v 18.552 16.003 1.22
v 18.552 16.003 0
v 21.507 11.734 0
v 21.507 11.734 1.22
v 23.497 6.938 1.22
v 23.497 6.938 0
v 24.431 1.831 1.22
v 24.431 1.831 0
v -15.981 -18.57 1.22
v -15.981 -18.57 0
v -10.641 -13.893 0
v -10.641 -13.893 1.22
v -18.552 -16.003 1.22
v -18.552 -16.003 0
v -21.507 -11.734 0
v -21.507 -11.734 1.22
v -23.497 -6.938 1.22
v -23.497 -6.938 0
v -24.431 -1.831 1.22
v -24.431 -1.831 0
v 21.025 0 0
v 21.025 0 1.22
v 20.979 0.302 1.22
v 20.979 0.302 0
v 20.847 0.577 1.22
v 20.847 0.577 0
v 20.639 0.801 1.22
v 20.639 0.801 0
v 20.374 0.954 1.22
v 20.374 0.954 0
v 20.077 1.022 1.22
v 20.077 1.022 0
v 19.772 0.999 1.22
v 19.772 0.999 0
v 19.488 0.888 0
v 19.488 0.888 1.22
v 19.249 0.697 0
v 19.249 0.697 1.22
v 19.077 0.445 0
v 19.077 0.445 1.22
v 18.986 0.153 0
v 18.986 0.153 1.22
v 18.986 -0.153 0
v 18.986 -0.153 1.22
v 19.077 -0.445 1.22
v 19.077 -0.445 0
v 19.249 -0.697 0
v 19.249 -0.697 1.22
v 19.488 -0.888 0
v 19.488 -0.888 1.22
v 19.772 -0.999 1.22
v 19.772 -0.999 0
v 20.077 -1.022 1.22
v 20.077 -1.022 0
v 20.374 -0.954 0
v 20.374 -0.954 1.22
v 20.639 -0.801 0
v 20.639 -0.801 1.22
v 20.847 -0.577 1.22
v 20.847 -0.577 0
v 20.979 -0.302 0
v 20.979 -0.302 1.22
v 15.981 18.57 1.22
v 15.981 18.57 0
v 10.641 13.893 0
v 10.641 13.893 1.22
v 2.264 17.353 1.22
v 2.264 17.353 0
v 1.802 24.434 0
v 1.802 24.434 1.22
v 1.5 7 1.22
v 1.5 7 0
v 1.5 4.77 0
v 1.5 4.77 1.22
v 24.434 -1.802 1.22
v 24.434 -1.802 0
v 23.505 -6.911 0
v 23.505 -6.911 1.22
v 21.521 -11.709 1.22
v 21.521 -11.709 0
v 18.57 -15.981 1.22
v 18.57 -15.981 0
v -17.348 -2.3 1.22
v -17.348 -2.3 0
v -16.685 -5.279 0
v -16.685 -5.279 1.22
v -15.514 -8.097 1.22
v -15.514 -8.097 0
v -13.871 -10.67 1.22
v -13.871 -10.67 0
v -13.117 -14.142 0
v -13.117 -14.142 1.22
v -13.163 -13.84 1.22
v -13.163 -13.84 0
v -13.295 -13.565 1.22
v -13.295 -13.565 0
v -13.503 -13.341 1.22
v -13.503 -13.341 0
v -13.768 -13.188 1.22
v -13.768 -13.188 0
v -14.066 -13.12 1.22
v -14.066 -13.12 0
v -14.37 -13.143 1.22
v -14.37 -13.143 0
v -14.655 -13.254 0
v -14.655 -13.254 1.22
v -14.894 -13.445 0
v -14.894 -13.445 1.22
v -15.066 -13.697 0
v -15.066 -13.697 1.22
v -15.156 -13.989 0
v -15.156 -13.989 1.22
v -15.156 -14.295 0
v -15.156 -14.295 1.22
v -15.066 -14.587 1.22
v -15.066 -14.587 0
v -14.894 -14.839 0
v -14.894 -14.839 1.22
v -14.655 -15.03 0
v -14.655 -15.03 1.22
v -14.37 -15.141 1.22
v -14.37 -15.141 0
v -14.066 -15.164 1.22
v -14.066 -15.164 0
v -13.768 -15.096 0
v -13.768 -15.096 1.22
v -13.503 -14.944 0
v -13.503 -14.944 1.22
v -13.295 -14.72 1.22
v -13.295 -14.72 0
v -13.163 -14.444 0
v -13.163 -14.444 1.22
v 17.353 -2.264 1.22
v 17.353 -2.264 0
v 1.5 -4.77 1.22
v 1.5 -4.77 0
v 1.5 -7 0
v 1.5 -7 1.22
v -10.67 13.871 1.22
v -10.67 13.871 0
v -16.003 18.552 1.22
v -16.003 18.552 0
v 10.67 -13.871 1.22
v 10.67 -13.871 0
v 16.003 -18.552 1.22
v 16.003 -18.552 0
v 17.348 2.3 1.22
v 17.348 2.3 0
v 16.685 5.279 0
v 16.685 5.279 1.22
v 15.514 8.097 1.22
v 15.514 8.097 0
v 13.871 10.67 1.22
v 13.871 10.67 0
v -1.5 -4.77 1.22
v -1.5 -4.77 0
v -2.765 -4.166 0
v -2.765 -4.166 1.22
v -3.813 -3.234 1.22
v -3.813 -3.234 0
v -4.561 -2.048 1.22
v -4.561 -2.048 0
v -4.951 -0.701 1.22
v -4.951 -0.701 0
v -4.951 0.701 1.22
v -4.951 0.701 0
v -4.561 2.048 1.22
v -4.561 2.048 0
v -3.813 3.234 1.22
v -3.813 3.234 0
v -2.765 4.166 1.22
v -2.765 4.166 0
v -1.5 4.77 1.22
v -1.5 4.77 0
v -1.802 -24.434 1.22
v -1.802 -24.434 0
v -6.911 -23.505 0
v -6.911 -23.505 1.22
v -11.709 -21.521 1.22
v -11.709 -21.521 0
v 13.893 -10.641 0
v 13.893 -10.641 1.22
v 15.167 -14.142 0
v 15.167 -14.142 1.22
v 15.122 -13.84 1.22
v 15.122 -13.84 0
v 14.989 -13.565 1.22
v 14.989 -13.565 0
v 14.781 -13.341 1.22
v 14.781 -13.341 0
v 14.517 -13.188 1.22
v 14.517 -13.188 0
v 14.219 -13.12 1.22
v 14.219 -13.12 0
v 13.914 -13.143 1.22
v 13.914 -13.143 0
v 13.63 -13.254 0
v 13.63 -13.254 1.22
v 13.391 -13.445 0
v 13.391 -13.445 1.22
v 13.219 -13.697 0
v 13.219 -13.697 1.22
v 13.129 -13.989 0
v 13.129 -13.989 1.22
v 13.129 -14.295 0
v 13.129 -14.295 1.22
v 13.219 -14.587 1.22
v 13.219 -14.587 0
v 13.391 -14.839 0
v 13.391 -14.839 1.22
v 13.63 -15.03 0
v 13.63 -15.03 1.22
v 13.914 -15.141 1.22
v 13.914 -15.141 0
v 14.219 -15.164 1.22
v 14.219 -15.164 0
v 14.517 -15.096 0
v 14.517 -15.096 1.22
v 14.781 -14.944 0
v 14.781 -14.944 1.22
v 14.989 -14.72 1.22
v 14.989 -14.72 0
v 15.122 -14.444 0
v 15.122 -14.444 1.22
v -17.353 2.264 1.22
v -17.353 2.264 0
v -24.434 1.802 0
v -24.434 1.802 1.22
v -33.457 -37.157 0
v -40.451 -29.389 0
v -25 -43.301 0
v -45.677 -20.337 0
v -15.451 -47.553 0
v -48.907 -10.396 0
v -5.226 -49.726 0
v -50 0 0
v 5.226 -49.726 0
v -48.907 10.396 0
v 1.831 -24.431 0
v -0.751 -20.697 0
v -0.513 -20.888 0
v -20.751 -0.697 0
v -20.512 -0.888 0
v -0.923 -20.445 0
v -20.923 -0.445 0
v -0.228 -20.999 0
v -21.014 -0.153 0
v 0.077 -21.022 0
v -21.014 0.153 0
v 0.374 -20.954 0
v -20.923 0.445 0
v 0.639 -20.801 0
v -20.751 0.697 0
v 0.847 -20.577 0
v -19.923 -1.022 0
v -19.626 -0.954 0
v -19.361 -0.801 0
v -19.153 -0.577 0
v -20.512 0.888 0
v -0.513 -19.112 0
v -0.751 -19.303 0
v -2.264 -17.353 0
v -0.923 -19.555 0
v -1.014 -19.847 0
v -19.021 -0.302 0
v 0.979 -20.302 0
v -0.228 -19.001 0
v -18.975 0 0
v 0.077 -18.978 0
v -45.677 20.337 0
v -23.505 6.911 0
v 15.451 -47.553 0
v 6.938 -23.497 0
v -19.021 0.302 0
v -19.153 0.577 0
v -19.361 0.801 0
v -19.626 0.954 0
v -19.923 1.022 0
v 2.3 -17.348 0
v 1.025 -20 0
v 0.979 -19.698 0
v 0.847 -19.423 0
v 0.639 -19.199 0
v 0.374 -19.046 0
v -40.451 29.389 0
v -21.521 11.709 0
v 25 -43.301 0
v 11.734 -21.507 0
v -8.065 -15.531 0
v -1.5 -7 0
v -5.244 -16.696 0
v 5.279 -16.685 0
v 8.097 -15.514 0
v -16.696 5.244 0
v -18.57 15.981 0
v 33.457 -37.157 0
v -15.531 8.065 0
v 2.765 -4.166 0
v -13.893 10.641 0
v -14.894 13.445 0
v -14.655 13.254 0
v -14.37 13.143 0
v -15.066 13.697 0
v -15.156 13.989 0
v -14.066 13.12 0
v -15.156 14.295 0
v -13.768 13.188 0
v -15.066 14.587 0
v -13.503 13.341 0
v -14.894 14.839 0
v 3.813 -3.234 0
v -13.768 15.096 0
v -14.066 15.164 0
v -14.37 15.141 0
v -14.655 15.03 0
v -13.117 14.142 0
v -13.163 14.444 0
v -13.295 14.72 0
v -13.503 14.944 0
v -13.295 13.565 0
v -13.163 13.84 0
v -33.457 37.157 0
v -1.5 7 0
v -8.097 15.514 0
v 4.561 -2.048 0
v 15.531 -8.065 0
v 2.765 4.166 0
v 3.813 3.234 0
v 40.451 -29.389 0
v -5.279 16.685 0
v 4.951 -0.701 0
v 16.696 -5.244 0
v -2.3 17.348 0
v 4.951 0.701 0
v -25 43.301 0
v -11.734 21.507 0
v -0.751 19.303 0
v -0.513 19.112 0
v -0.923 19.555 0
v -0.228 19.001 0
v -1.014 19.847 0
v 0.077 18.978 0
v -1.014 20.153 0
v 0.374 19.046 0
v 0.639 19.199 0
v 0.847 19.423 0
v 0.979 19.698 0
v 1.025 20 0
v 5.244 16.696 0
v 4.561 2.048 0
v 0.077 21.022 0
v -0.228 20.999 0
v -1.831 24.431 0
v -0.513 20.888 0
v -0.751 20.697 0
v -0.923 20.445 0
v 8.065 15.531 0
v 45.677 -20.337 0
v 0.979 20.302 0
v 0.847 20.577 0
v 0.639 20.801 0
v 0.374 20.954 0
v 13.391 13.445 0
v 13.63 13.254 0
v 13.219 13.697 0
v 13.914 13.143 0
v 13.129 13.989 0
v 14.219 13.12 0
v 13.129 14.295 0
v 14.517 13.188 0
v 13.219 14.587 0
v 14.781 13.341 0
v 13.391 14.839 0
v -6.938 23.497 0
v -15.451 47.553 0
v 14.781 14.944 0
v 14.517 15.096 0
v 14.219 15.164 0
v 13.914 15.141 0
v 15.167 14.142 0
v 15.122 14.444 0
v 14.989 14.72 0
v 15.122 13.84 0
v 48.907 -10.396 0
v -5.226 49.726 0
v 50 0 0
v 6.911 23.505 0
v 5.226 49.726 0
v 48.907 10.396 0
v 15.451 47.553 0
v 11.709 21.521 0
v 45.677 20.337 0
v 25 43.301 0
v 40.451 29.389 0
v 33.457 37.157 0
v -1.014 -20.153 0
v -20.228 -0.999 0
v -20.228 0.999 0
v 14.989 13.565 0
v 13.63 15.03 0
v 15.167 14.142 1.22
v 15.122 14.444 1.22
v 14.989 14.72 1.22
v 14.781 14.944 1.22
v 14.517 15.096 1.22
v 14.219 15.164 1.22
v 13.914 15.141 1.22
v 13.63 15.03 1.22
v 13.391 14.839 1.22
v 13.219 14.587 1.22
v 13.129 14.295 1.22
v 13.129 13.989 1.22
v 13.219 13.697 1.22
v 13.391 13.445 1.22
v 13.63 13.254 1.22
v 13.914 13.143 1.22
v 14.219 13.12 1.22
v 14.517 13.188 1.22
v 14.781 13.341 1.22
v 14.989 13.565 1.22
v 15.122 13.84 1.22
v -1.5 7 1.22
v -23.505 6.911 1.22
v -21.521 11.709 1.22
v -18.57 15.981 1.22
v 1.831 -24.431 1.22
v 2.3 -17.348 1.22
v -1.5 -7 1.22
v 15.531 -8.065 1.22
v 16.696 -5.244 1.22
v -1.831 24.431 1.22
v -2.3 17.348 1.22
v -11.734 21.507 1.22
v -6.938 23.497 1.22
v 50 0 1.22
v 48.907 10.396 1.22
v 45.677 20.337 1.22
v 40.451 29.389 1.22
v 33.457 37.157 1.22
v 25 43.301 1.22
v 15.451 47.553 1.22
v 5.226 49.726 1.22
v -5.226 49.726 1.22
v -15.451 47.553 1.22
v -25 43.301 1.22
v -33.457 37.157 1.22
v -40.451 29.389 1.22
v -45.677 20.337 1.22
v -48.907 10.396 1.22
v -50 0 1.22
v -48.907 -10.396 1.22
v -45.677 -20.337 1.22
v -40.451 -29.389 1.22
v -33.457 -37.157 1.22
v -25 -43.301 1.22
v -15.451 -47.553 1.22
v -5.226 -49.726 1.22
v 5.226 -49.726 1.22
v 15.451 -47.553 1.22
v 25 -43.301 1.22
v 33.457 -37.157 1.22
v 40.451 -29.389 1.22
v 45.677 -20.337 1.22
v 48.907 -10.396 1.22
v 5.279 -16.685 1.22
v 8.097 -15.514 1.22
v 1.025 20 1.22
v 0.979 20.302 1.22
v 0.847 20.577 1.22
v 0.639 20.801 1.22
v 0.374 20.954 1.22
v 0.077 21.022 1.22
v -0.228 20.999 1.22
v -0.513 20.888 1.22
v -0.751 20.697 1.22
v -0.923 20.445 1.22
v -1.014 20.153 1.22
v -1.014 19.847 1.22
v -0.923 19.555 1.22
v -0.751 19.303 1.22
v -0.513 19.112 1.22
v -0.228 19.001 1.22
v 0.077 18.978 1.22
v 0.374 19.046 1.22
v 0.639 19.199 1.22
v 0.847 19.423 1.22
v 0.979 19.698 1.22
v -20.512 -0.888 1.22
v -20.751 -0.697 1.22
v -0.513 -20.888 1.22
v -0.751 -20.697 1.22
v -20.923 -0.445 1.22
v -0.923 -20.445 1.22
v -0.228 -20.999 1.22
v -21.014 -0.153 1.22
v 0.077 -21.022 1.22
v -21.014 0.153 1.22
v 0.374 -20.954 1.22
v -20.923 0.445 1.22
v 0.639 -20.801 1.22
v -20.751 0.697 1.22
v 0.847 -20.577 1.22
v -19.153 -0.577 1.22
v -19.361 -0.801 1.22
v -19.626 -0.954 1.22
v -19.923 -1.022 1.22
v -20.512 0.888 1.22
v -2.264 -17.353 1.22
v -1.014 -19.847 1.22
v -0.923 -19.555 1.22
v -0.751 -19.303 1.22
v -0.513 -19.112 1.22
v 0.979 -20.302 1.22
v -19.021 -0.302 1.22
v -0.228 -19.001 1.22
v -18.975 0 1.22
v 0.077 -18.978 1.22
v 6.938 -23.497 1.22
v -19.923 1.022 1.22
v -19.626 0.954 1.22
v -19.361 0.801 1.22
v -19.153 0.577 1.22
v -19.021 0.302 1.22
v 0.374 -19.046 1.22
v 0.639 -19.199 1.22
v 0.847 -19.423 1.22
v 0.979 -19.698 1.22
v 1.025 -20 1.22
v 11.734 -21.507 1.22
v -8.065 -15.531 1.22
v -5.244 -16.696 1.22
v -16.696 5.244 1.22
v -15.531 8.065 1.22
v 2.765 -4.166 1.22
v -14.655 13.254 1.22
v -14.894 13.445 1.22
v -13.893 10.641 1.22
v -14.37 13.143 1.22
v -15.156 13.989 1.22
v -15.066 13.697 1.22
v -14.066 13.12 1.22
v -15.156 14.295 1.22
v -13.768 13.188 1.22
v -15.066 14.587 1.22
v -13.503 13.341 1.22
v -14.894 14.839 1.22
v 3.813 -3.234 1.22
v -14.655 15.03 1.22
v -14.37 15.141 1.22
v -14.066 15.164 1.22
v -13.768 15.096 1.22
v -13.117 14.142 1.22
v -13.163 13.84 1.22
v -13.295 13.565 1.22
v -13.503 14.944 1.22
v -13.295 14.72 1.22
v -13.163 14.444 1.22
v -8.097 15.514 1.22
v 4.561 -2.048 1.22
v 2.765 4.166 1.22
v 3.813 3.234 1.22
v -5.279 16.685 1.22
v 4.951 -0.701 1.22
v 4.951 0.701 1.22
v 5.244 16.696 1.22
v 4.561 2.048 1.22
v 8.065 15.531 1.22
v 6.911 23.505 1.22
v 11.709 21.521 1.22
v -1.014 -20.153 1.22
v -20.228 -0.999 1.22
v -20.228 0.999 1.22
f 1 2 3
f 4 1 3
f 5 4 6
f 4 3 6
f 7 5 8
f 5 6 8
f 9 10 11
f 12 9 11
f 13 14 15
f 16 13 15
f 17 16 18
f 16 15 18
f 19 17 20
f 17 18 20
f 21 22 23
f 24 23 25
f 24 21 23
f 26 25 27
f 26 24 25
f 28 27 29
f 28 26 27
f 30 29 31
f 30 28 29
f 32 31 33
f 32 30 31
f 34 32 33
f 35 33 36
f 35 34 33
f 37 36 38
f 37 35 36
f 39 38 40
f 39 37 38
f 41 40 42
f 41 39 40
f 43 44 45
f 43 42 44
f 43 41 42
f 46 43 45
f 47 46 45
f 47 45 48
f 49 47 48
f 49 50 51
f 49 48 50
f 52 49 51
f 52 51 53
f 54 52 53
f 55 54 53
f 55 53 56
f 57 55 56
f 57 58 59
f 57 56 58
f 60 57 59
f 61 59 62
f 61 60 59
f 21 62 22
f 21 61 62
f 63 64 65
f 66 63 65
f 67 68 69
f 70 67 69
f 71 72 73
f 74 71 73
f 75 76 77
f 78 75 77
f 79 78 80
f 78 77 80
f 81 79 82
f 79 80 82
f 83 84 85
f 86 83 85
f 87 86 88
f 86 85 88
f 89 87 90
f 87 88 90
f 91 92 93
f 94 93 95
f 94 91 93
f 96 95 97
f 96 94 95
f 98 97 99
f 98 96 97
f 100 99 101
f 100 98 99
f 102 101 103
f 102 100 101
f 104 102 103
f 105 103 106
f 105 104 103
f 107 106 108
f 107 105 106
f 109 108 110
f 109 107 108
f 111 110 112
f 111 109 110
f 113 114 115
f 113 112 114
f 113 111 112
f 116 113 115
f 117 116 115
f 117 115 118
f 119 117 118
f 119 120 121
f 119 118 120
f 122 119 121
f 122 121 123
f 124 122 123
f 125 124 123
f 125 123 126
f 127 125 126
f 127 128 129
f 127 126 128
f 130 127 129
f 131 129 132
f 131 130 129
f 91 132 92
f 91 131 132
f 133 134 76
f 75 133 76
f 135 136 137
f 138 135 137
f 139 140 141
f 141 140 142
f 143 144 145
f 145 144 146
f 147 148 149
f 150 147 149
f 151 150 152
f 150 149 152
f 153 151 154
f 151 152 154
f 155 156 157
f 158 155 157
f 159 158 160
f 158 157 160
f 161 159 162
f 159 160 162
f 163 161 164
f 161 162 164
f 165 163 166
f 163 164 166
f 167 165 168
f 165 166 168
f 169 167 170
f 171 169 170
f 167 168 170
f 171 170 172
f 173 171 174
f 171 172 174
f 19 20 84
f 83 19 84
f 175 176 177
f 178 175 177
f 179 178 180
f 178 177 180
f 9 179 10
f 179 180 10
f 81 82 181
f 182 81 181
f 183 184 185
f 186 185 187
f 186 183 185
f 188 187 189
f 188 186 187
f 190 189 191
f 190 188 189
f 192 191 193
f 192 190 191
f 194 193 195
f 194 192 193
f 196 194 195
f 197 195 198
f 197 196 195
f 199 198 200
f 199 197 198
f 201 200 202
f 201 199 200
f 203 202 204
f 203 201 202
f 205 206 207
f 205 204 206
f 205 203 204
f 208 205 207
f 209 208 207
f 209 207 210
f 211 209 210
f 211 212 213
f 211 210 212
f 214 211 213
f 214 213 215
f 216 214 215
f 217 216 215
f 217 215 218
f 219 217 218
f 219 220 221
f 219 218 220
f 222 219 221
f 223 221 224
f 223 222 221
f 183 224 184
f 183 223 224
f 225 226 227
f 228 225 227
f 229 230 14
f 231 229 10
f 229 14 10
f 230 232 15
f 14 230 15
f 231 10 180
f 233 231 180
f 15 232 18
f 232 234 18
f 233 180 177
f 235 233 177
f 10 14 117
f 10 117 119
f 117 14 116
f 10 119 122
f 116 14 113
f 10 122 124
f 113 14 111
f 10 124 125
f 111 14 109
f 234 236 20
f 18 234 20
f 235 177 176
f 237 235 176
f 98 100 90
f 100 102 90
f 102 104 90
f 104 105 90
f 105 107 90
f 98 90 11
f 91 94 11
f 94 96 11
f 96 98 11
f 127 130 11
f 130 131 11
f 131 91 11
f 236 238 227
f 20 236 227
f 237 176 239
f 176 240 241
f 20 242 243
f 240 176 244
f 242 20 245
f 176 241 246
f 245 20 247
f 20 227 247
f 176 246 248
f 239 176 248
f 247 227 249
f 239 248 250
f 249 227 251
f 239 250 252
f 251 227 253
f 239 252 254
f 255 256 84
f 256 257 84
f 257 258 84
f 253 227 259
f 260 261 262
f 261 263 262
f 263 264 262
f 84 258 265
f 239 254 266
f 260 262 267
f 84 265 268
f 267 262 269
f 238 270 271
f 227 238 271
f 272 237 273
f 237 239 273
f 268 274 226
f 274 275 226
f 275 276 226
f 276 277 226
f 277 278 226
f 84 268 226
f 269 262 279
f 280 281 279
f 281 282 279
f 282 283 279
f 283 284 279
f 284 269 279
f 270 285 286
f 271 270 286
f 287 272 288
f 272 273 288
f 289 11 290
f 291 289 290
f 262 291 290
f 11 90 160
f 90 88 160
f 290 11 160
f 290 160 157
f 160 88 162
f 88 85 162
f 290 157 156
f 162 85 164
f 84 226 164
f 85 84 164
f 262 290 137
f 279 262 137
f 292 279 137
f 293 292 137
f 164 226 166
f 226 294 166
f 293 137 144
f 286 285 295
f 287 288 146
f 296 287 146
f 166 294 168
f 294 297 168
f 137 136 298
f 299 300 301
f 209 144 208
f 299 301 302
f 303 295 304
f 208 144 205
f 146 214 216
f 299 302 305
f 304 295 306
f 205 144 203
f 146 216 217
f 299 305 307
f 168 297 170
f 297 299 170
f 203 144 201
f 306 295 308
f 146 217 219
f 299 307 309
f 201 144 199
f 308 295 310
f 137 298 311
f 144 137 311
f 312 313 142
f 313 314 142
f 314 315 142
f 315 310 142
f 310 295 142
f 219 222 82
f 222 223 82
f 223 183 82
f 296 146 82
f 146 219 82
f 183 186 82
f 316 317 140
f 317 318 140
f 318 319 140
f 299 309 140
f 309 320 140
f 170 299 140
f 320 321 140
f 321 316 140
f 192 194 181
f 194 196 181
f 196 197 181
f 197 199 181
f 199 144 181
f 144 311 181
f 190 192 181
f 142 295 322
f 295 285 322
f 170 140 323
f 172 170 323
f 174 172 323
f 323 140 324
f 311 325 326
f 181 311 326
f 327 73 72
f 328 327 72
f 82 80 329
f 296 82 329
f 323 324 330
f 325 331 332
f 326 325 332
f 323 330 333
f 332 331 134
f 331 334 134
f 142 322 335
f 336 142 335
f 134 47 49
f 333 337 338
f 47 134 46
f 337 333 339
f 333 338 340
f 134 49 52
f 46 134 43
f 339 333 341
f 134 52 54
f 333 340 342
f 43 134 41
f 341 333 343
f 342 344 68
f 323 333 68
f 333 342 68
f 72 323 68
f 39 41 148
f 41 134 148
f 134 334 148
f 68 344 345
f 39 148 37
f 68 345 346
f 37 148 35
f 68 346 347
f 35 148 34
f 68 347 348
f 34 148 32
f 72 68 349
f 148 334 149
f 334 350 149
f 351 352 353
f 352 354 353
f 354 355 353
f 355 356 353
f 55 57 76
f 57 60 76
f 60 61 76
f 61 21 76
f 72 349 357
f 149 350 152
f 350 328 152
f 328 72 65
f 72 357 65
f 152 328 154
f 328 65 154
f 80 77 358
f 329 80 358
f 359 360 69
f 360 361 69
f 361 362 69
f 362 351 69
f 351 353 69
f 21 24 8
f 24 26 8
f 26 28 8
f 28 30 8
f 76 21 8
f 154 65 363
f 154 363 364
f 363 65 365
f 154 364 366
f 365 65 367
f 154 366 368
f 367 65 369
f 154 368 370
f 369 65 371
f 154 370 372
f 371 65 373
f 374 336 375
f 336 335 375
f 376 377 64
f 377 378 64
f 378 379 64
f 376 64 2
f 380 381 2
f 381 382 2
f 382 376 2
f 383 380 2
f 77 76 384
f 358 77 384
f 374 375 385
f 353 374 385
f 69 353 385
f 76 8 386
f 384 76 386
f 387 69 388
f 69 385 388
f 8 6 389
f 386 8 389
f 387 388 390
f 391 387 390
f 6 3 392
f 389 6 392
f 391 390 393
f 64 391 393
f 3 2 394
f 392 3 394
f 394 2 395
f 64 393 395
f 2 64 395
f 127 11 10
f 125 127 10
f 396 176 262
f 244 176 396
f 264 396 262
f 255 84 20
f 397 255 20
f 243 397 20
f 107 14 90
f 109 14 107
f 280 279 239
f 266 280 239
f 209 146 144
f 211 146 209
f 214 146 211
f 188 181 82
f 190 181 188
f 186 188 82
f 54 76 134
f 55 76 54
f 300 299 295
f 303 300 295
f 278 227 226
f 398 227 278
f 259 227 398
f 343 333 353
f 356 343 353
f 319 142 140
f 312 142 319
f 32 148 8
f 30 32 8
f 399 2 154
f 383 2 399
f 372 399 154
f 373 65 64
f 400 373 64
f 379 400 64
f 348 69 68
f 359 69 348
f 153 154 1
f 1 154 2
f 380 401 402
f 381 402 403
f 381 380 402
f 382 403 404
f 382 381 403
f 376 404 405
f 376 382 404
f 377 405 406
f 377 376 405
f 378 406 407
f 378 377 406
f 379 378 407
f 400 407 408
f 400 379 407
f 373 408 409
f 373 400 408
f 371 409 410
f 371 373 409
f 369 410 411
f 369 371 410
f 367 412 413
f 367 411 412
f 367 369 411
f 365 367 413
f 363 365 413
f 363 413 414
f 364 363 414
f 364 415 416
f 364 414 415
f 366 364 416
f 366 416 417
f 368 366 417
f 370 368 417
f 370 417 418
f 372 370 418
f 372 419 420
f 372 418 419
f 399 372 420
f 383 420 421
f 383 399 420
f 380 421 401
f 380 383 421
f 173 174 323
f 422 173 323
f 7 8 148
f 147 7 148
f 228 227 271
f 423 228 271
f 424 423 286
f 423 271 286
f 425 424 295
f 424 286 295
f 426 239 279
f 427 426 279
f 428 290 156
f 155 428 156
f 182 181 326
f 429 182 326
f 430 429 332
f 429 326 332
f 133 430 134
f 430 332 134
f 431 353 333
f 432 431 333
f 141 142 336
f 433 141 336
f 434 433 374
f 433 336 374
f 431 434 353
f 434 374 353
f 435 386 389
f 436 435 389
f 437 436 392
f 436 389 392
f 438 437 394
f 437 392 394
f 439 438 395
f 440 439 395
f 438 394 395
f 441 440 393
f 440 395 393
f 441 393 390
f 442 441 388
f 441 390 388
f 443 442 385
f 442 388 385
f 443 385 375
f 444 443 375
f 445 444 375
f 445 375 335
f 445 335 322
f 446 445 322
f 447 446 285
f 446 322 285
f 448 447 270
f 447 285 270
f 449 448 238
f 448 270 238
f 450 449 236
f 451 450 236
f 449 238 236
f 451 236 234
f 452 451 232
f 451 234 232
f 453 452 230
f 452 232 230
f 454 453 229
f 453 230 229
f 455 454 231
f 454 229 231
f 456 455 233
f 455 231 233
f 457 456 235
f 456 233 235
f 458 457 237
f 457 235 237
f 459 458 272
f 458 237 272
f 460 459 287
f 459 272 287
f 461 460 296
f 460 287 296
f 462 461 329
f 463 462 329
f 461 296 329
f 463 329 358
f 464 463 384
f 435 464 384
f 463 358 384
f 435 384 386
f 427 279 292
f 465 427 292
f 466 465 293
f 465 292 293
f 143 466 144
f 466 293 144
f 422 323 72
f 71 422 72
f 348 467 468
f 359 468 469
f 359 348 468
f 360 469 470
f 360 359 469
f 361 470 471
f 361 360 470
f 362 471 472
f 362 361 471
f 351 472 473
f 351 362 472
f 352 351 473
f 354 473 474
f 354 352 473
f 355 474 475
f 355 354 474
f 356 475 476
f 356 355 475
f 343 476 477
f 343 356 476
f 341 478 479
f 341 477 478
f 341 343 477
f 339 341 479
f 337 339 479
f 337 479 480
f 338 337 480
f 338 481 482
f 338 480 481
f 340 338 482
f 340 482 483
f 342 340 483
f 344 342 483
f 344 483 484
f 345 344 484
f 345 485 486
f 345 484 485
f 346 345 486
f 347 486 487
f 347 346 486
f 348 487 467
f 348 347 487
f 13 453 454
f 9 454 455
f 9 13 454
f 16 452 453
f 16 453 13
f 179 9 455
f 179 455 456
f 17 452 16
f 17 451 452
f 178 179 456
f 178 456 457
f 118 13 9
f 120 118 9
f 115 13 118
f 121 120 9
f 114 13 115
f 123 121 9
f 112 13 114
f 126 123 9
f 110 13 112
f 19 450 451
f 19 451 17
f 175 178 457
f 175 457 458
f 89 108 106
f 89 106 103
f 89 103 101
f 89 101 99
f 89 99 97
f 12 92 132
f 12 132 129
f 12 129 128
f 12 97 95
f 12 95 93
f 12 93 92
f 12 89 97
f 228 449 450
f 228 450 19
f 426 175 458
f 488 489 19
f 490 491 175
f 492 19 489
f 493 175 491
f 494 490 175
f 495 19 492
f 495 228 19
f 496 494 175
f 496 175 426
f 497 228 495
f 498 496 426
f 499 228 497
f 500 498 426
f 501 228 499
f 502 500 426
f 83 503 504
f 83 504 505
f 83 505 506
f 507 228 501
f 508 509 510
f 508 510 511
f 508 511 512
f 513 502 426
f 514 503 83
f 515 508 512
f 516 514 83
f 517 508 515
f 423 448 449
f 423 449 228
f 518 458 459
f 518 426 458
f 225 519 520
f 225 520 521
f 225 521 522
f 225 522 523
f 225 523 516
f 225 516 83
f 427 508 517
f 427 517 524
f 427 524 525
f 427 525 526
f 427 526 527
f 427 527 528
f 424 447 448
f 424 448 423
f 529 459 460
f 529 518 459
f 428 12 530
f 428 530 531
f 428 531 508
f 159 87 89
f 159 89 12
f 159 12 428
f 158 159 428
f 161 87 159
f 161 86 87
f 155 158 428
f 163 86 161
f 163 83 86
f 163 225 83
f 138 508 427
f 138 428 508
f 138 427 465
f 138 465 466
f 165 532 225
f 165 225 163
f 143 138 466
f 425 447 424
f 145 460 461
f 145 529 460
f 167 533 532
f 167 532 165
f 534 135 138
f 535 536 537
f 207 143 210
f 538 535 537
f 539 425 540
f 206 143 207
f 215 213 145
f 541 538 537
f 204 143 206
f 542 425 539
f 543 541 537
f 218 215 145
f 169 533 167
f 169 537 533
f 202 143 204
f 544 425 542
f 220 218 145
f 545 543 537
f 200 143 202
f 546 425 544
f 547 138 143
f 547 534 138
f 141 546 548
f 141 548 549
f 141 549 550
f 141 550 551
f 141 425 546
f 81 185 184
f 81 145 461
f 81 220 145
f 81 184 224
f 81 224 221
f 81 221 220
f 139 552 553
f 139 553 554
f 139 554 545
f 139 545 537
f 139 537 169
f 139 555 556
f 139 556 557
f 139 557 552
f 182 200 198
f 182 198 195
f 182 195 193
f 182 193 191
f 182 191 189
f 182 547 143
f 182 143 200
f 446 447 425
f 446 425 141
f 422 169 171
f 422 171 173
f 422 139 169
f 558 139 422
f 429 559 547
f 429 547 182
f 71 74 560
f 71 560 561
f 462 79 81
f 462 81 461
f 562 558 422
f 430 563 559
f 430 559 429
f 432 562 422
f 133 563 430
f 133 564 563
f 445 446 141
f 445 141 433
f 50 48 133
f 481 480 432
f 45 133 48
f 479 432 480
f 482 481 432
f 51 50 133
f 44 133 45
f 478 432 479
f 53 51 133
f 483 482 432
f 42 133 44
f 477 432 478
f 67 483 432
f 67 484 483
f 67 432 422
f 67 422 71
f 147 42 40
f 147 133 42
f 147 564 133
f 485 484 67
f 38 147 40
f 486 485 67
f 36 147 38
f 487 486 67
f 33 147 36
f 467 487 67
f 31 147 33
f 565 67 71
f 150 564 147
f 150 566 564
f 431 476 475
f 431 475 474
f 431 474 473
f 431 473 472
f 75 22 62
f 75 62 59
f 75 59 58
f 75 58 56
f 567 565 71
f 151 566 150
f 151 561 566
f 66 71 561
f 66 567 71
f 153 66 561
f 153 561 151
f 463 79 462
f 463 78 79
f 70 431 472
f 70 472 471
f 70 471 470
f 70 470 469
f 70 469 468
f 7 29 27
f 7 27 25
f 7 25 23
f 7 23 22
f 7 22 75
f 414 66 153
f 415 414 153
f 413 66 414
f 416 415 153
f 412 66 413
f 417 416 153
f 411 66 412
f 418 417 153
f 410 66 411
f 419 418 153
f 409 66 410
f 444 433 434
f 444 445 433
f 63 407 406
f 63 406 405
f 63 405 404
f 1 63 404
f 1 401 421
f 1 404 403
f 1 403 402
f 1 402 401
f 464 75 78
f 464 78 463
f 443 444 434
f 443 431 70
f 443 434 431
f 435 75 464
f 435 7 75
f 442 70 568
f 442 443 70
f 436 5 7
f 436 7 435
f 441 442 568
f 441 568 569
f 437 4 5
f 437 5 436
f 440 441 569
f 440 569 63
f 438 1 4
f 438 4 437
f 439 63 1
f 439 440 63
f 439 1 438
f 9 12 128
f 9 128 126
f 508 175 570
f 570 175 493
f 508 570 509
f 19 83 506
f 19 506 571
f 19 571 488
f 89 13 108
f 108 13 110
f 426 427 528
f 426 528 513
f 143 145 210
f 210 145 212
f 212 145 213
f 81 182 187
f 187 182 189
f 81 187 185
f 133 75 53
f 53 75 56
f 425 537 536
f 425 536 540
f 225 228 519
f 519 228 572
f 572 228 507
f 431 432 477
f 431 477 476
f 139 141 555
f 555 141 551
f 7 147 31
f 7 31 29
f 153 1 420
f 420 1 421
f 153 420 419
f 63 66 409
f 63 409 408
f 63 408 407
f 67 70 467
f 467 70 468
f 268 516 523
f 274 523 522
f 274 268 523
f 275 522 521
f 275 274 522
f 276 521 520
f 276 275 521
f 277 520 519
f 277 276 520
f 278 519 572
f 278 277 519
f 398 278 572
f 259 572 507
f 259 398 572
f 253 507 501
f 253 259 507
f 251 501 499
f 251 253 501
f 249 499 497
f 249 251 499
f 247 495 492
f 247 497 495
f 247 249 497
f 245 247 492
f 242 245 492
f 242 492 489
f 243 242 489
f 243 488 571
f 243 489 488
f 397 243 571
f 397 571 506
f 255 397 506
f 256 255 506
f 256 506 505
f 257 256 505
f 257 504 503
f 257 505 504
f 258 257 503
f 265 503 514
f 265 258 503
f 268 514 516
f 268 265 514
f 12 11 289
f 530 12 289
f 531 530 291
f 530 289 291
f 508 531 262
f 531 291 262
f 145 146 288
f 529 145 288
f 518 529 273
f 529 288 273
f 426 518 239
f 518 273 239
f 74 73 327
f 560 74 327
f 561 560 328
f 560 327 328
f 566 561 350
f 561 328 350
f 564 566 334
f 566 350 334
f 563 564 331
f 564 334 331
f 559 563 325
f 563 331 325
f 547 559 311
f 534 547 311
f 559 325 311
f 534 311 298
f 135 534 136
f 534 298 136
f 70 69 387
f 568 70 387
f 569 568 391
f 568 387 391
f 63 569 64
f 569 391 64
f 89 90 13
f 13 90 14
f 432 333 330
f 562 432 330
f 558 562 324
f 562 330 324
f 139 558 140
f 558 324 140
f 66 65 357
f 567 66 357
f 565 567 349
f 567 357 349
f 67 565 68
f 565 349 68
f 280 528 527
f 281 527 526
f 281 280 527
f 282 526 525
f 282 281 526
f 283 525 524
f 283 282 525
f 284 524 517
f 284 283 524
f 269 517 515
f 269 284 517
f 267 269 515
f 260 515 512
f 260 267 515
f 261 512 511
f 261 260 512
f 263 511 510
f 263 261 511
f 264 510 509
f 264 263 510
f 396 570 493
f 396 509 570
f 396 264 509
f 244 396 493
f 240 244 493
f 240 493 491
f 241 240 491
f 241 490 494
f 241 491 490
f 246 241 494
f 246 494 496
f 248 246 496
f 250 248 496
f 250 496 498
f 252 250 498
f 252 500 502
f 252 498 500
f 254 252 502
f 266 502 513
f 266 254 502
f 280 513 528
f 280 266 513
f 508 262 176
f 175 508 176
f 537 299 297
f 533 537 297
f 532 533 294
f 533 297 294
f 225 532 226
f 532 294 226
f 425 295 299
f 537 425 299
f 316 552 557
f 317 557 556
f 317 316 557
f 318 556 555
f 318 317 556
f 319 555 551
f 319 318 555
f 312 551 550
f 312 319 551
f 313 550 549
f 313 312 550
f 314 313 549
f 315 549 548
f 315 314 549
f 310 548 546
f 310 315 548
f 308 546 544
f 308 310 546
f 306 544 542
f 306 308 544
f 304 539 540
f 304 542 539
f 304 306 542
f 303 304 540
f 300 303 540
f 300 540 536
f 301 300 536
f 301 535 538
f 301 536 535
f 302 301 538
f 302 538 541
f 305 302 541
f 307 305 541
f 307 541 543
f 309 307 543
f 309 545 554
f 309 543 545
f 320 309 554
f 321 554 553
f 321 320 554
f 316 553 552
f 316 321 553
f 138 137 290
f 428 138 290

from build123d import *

# Parameters (mm, degrees)
BOSS_EXTRUDE1_OUTLINE_R = 50
BOSS_EXTRUDE1_DEPTH     = 1.22
SKETCH2_R               = 1.025
CUT_EXTRUDE2_DEPTH      = 10


# Read off the part's stored shape, not the designer's step: Boss-Extrude1
with BuildPart() as part:
    # Boss-Extrude1 outline → Boss-Extrude1 (new body)
    with BuildSketch(Plane.XY):
        Circle(BOSS_EXTRUDE1_OUTLINE_R)
        with BuildLine():
            ThreePointArc((-10.640683383, -13.893374577), (-6.680080661, -16.174873179), (-2.263779528, -17.352962348))
            Line((-2.263779528, -17.352962348), (-1.802339331, -24.433615634))
            ThreePointArc((-1.802339331, -24.433615634), (-9.36241701, -22.64056421), (-15.980874836, -18.570450707))
            Line((-15.980874836, -18.570450707), (-10.640683383, -13.893374577))
        make_face(mode=Mode.SUBTRACT)
        with BuildLine():
            ThreePointArc((-17.348198754, -2.3), (-16.160892844, -6.713832175), (-13.871131205, -10.669663495))
            Line((-13.871131205, -10.669663495), (-18.551621667, -16.00272894))
            ThreePointArc((-18.551621667, -16.00272894), (-22.629525039, -9.389067926), (-24.431476591, -1.831106659))
            Line((-24.431476591, -1.831106659), (-17.348198754, -2.3))
        make_face(mode=Mode.SUBTRACT)
        with BuildLine():
            ThreePointArc((2.3, -17.348198754), (6.713832175, -16.160892844), (10.669663495, -13.871131205))
            Line((10.669663495, -13.871131205), (16.00272894, -18.551621667))
            ThreePointArc((16.00272894, -18.551621667), (9.389067926, -22.629525039), (1.831106659, -24.431476591))
            Line((1.831106659, -24.431476591), (2.3, -17.348198754))
        make_face(mode=Mode.SUBTRACT)
        with BuildLine():
            ThreePointArc((13.893374577, -10.640683383), (16.174873179, -6.680080661), (17.352962348, -2.263779528))
            Line((17.352962348, -2.263779528), (24.433615634, -1.802339331))
            ThreePointArc((24.433615634, -1.802339331), (22.64056421, -9.36241701), (18.570450707, -15.980874836))
            Line((18.570450707, -15.980874836), (13.893374577, -10.640683383))
        make_face(mode=Mode.SUBTRACT)
        with BuildLine():
            ThreePointArc((-13.893374577, 10.640683383), (-16.174873179, 6.680080661), (-17.352962348, 2.263779528))
            Line((-17.352962348, 2.263779528), (-24.433615634, 1.802339331))
            ThreePointArc((-24.433615634, 1.802339331), (-22.64056421, 9.36241701), (-18.570450707, 15.980874836))
            Line((-18.570450707, 15.980874836), (-13.893374577, 10.640683383))
        make_face(mode=Mode.SUBTRACT)
        with BuildLine():
            ThreePointArc((-2.3, 17.348198754), (-6.713832175, 16.160892844), (-10.669663495, 13.871131205))
            Line((-10.669663495, 13.871131205), (-16.00272894, 18.551621667))
            ThreePointArc((-16.00272894, 18.551621667), (-9.389067926, 22.629525039), (-1.831106659, 24.431476591))
            Line((-1.831106659, 24.431476591), (-2.3, 17.348198754))
        make_face(mode=Mode.SUBTRACT)
        with BuildLine():
            ThreePointArc((-1.5, -4.769696007), (-5, 0), (-1.5, 4.769696007))
            Line((-1.5, 4.769696007), (-1.5, 7))
            Line((-1.5, 7), (1.5, 7))
            Line((1.5, 7), (1.5, 4.769696007))
            ThreePointArc((1.5, 4.769696007), (5, 0), (1.5, -4.769696007))
            Line((1.5, -4.769696007), (1.5, -7))
            Line((1.5, -7), (-1.5, -7))
            Line((-1.5, -7), (-1.5, -4.769696007))
        make_face(mode=Mode.SUBTRACT)
        with BuildLine():
            ThreePointArc((17.348198754, 2.3), (16.160892844, 6.713832175), (13.871131205, 10.669663495))
            Line((13.871131205, 10.669663495), (18.551621667, 16.00272894))
            ThreePointArc((18.551621667, 16.00272894), (22.629525039, 9.389067926), (24.431476591, 1.831106659))
            Line((24.431476591, 1.831106659), (17.348198754, 2.3))
        make_face(mode=Mode.SUBTRACT)
        with BuildLine():
            ThreePointArc((10.640683383, 13.893374577), (6.680080661, 16.174873179), (2.263779528, 17.352962348))
            Line((2.263779528, 17.352962348), (1.802339331, 24.433615634))
            ThreePointArc((1.802339331, 24.433615634), (9.36241701, 22.64056421), (15.980874836, 18.570450707))
            Line((15.980874836, 18.570450707), (10.640683383, 13.893374577))
        make_face(mode=Mode.SUBTRACT)
    extrude(amount=BOSS_EXTRUDE1_DEPTH)

    # Sketch2 → Cut-Extrude2 (cut)
    with BuildSketch(Plane.XY):
        with Locations((0, 20)):
            Circle(SKETCH2_R)
        with Locations((14.142135624, 14.142135624)):
            Circle(SKETCH2_R)
        with Locations((20, 0)):
            Circle(SKETCH2_R)
        with Locations((14.142135624, -14.142135624)):
            Circle(SKETCH2_R)
        with Locations((0, -20)):
            Circle(SKETCH2_R)
        with Locations((-14.142135624, -14.142135624)):
            Circle(SKETCH2_R)
        with Locations((-20, 0)):
            Circle(SKETCH2_R)
        with Locations((-14.142135624, 14.142135624)):
            Circle(SKETCH2_R)
    extrude(amount=CUT_EXTRUDE2_DEPTH, mode=Mode.SUBTRACT)


solid = part.part
